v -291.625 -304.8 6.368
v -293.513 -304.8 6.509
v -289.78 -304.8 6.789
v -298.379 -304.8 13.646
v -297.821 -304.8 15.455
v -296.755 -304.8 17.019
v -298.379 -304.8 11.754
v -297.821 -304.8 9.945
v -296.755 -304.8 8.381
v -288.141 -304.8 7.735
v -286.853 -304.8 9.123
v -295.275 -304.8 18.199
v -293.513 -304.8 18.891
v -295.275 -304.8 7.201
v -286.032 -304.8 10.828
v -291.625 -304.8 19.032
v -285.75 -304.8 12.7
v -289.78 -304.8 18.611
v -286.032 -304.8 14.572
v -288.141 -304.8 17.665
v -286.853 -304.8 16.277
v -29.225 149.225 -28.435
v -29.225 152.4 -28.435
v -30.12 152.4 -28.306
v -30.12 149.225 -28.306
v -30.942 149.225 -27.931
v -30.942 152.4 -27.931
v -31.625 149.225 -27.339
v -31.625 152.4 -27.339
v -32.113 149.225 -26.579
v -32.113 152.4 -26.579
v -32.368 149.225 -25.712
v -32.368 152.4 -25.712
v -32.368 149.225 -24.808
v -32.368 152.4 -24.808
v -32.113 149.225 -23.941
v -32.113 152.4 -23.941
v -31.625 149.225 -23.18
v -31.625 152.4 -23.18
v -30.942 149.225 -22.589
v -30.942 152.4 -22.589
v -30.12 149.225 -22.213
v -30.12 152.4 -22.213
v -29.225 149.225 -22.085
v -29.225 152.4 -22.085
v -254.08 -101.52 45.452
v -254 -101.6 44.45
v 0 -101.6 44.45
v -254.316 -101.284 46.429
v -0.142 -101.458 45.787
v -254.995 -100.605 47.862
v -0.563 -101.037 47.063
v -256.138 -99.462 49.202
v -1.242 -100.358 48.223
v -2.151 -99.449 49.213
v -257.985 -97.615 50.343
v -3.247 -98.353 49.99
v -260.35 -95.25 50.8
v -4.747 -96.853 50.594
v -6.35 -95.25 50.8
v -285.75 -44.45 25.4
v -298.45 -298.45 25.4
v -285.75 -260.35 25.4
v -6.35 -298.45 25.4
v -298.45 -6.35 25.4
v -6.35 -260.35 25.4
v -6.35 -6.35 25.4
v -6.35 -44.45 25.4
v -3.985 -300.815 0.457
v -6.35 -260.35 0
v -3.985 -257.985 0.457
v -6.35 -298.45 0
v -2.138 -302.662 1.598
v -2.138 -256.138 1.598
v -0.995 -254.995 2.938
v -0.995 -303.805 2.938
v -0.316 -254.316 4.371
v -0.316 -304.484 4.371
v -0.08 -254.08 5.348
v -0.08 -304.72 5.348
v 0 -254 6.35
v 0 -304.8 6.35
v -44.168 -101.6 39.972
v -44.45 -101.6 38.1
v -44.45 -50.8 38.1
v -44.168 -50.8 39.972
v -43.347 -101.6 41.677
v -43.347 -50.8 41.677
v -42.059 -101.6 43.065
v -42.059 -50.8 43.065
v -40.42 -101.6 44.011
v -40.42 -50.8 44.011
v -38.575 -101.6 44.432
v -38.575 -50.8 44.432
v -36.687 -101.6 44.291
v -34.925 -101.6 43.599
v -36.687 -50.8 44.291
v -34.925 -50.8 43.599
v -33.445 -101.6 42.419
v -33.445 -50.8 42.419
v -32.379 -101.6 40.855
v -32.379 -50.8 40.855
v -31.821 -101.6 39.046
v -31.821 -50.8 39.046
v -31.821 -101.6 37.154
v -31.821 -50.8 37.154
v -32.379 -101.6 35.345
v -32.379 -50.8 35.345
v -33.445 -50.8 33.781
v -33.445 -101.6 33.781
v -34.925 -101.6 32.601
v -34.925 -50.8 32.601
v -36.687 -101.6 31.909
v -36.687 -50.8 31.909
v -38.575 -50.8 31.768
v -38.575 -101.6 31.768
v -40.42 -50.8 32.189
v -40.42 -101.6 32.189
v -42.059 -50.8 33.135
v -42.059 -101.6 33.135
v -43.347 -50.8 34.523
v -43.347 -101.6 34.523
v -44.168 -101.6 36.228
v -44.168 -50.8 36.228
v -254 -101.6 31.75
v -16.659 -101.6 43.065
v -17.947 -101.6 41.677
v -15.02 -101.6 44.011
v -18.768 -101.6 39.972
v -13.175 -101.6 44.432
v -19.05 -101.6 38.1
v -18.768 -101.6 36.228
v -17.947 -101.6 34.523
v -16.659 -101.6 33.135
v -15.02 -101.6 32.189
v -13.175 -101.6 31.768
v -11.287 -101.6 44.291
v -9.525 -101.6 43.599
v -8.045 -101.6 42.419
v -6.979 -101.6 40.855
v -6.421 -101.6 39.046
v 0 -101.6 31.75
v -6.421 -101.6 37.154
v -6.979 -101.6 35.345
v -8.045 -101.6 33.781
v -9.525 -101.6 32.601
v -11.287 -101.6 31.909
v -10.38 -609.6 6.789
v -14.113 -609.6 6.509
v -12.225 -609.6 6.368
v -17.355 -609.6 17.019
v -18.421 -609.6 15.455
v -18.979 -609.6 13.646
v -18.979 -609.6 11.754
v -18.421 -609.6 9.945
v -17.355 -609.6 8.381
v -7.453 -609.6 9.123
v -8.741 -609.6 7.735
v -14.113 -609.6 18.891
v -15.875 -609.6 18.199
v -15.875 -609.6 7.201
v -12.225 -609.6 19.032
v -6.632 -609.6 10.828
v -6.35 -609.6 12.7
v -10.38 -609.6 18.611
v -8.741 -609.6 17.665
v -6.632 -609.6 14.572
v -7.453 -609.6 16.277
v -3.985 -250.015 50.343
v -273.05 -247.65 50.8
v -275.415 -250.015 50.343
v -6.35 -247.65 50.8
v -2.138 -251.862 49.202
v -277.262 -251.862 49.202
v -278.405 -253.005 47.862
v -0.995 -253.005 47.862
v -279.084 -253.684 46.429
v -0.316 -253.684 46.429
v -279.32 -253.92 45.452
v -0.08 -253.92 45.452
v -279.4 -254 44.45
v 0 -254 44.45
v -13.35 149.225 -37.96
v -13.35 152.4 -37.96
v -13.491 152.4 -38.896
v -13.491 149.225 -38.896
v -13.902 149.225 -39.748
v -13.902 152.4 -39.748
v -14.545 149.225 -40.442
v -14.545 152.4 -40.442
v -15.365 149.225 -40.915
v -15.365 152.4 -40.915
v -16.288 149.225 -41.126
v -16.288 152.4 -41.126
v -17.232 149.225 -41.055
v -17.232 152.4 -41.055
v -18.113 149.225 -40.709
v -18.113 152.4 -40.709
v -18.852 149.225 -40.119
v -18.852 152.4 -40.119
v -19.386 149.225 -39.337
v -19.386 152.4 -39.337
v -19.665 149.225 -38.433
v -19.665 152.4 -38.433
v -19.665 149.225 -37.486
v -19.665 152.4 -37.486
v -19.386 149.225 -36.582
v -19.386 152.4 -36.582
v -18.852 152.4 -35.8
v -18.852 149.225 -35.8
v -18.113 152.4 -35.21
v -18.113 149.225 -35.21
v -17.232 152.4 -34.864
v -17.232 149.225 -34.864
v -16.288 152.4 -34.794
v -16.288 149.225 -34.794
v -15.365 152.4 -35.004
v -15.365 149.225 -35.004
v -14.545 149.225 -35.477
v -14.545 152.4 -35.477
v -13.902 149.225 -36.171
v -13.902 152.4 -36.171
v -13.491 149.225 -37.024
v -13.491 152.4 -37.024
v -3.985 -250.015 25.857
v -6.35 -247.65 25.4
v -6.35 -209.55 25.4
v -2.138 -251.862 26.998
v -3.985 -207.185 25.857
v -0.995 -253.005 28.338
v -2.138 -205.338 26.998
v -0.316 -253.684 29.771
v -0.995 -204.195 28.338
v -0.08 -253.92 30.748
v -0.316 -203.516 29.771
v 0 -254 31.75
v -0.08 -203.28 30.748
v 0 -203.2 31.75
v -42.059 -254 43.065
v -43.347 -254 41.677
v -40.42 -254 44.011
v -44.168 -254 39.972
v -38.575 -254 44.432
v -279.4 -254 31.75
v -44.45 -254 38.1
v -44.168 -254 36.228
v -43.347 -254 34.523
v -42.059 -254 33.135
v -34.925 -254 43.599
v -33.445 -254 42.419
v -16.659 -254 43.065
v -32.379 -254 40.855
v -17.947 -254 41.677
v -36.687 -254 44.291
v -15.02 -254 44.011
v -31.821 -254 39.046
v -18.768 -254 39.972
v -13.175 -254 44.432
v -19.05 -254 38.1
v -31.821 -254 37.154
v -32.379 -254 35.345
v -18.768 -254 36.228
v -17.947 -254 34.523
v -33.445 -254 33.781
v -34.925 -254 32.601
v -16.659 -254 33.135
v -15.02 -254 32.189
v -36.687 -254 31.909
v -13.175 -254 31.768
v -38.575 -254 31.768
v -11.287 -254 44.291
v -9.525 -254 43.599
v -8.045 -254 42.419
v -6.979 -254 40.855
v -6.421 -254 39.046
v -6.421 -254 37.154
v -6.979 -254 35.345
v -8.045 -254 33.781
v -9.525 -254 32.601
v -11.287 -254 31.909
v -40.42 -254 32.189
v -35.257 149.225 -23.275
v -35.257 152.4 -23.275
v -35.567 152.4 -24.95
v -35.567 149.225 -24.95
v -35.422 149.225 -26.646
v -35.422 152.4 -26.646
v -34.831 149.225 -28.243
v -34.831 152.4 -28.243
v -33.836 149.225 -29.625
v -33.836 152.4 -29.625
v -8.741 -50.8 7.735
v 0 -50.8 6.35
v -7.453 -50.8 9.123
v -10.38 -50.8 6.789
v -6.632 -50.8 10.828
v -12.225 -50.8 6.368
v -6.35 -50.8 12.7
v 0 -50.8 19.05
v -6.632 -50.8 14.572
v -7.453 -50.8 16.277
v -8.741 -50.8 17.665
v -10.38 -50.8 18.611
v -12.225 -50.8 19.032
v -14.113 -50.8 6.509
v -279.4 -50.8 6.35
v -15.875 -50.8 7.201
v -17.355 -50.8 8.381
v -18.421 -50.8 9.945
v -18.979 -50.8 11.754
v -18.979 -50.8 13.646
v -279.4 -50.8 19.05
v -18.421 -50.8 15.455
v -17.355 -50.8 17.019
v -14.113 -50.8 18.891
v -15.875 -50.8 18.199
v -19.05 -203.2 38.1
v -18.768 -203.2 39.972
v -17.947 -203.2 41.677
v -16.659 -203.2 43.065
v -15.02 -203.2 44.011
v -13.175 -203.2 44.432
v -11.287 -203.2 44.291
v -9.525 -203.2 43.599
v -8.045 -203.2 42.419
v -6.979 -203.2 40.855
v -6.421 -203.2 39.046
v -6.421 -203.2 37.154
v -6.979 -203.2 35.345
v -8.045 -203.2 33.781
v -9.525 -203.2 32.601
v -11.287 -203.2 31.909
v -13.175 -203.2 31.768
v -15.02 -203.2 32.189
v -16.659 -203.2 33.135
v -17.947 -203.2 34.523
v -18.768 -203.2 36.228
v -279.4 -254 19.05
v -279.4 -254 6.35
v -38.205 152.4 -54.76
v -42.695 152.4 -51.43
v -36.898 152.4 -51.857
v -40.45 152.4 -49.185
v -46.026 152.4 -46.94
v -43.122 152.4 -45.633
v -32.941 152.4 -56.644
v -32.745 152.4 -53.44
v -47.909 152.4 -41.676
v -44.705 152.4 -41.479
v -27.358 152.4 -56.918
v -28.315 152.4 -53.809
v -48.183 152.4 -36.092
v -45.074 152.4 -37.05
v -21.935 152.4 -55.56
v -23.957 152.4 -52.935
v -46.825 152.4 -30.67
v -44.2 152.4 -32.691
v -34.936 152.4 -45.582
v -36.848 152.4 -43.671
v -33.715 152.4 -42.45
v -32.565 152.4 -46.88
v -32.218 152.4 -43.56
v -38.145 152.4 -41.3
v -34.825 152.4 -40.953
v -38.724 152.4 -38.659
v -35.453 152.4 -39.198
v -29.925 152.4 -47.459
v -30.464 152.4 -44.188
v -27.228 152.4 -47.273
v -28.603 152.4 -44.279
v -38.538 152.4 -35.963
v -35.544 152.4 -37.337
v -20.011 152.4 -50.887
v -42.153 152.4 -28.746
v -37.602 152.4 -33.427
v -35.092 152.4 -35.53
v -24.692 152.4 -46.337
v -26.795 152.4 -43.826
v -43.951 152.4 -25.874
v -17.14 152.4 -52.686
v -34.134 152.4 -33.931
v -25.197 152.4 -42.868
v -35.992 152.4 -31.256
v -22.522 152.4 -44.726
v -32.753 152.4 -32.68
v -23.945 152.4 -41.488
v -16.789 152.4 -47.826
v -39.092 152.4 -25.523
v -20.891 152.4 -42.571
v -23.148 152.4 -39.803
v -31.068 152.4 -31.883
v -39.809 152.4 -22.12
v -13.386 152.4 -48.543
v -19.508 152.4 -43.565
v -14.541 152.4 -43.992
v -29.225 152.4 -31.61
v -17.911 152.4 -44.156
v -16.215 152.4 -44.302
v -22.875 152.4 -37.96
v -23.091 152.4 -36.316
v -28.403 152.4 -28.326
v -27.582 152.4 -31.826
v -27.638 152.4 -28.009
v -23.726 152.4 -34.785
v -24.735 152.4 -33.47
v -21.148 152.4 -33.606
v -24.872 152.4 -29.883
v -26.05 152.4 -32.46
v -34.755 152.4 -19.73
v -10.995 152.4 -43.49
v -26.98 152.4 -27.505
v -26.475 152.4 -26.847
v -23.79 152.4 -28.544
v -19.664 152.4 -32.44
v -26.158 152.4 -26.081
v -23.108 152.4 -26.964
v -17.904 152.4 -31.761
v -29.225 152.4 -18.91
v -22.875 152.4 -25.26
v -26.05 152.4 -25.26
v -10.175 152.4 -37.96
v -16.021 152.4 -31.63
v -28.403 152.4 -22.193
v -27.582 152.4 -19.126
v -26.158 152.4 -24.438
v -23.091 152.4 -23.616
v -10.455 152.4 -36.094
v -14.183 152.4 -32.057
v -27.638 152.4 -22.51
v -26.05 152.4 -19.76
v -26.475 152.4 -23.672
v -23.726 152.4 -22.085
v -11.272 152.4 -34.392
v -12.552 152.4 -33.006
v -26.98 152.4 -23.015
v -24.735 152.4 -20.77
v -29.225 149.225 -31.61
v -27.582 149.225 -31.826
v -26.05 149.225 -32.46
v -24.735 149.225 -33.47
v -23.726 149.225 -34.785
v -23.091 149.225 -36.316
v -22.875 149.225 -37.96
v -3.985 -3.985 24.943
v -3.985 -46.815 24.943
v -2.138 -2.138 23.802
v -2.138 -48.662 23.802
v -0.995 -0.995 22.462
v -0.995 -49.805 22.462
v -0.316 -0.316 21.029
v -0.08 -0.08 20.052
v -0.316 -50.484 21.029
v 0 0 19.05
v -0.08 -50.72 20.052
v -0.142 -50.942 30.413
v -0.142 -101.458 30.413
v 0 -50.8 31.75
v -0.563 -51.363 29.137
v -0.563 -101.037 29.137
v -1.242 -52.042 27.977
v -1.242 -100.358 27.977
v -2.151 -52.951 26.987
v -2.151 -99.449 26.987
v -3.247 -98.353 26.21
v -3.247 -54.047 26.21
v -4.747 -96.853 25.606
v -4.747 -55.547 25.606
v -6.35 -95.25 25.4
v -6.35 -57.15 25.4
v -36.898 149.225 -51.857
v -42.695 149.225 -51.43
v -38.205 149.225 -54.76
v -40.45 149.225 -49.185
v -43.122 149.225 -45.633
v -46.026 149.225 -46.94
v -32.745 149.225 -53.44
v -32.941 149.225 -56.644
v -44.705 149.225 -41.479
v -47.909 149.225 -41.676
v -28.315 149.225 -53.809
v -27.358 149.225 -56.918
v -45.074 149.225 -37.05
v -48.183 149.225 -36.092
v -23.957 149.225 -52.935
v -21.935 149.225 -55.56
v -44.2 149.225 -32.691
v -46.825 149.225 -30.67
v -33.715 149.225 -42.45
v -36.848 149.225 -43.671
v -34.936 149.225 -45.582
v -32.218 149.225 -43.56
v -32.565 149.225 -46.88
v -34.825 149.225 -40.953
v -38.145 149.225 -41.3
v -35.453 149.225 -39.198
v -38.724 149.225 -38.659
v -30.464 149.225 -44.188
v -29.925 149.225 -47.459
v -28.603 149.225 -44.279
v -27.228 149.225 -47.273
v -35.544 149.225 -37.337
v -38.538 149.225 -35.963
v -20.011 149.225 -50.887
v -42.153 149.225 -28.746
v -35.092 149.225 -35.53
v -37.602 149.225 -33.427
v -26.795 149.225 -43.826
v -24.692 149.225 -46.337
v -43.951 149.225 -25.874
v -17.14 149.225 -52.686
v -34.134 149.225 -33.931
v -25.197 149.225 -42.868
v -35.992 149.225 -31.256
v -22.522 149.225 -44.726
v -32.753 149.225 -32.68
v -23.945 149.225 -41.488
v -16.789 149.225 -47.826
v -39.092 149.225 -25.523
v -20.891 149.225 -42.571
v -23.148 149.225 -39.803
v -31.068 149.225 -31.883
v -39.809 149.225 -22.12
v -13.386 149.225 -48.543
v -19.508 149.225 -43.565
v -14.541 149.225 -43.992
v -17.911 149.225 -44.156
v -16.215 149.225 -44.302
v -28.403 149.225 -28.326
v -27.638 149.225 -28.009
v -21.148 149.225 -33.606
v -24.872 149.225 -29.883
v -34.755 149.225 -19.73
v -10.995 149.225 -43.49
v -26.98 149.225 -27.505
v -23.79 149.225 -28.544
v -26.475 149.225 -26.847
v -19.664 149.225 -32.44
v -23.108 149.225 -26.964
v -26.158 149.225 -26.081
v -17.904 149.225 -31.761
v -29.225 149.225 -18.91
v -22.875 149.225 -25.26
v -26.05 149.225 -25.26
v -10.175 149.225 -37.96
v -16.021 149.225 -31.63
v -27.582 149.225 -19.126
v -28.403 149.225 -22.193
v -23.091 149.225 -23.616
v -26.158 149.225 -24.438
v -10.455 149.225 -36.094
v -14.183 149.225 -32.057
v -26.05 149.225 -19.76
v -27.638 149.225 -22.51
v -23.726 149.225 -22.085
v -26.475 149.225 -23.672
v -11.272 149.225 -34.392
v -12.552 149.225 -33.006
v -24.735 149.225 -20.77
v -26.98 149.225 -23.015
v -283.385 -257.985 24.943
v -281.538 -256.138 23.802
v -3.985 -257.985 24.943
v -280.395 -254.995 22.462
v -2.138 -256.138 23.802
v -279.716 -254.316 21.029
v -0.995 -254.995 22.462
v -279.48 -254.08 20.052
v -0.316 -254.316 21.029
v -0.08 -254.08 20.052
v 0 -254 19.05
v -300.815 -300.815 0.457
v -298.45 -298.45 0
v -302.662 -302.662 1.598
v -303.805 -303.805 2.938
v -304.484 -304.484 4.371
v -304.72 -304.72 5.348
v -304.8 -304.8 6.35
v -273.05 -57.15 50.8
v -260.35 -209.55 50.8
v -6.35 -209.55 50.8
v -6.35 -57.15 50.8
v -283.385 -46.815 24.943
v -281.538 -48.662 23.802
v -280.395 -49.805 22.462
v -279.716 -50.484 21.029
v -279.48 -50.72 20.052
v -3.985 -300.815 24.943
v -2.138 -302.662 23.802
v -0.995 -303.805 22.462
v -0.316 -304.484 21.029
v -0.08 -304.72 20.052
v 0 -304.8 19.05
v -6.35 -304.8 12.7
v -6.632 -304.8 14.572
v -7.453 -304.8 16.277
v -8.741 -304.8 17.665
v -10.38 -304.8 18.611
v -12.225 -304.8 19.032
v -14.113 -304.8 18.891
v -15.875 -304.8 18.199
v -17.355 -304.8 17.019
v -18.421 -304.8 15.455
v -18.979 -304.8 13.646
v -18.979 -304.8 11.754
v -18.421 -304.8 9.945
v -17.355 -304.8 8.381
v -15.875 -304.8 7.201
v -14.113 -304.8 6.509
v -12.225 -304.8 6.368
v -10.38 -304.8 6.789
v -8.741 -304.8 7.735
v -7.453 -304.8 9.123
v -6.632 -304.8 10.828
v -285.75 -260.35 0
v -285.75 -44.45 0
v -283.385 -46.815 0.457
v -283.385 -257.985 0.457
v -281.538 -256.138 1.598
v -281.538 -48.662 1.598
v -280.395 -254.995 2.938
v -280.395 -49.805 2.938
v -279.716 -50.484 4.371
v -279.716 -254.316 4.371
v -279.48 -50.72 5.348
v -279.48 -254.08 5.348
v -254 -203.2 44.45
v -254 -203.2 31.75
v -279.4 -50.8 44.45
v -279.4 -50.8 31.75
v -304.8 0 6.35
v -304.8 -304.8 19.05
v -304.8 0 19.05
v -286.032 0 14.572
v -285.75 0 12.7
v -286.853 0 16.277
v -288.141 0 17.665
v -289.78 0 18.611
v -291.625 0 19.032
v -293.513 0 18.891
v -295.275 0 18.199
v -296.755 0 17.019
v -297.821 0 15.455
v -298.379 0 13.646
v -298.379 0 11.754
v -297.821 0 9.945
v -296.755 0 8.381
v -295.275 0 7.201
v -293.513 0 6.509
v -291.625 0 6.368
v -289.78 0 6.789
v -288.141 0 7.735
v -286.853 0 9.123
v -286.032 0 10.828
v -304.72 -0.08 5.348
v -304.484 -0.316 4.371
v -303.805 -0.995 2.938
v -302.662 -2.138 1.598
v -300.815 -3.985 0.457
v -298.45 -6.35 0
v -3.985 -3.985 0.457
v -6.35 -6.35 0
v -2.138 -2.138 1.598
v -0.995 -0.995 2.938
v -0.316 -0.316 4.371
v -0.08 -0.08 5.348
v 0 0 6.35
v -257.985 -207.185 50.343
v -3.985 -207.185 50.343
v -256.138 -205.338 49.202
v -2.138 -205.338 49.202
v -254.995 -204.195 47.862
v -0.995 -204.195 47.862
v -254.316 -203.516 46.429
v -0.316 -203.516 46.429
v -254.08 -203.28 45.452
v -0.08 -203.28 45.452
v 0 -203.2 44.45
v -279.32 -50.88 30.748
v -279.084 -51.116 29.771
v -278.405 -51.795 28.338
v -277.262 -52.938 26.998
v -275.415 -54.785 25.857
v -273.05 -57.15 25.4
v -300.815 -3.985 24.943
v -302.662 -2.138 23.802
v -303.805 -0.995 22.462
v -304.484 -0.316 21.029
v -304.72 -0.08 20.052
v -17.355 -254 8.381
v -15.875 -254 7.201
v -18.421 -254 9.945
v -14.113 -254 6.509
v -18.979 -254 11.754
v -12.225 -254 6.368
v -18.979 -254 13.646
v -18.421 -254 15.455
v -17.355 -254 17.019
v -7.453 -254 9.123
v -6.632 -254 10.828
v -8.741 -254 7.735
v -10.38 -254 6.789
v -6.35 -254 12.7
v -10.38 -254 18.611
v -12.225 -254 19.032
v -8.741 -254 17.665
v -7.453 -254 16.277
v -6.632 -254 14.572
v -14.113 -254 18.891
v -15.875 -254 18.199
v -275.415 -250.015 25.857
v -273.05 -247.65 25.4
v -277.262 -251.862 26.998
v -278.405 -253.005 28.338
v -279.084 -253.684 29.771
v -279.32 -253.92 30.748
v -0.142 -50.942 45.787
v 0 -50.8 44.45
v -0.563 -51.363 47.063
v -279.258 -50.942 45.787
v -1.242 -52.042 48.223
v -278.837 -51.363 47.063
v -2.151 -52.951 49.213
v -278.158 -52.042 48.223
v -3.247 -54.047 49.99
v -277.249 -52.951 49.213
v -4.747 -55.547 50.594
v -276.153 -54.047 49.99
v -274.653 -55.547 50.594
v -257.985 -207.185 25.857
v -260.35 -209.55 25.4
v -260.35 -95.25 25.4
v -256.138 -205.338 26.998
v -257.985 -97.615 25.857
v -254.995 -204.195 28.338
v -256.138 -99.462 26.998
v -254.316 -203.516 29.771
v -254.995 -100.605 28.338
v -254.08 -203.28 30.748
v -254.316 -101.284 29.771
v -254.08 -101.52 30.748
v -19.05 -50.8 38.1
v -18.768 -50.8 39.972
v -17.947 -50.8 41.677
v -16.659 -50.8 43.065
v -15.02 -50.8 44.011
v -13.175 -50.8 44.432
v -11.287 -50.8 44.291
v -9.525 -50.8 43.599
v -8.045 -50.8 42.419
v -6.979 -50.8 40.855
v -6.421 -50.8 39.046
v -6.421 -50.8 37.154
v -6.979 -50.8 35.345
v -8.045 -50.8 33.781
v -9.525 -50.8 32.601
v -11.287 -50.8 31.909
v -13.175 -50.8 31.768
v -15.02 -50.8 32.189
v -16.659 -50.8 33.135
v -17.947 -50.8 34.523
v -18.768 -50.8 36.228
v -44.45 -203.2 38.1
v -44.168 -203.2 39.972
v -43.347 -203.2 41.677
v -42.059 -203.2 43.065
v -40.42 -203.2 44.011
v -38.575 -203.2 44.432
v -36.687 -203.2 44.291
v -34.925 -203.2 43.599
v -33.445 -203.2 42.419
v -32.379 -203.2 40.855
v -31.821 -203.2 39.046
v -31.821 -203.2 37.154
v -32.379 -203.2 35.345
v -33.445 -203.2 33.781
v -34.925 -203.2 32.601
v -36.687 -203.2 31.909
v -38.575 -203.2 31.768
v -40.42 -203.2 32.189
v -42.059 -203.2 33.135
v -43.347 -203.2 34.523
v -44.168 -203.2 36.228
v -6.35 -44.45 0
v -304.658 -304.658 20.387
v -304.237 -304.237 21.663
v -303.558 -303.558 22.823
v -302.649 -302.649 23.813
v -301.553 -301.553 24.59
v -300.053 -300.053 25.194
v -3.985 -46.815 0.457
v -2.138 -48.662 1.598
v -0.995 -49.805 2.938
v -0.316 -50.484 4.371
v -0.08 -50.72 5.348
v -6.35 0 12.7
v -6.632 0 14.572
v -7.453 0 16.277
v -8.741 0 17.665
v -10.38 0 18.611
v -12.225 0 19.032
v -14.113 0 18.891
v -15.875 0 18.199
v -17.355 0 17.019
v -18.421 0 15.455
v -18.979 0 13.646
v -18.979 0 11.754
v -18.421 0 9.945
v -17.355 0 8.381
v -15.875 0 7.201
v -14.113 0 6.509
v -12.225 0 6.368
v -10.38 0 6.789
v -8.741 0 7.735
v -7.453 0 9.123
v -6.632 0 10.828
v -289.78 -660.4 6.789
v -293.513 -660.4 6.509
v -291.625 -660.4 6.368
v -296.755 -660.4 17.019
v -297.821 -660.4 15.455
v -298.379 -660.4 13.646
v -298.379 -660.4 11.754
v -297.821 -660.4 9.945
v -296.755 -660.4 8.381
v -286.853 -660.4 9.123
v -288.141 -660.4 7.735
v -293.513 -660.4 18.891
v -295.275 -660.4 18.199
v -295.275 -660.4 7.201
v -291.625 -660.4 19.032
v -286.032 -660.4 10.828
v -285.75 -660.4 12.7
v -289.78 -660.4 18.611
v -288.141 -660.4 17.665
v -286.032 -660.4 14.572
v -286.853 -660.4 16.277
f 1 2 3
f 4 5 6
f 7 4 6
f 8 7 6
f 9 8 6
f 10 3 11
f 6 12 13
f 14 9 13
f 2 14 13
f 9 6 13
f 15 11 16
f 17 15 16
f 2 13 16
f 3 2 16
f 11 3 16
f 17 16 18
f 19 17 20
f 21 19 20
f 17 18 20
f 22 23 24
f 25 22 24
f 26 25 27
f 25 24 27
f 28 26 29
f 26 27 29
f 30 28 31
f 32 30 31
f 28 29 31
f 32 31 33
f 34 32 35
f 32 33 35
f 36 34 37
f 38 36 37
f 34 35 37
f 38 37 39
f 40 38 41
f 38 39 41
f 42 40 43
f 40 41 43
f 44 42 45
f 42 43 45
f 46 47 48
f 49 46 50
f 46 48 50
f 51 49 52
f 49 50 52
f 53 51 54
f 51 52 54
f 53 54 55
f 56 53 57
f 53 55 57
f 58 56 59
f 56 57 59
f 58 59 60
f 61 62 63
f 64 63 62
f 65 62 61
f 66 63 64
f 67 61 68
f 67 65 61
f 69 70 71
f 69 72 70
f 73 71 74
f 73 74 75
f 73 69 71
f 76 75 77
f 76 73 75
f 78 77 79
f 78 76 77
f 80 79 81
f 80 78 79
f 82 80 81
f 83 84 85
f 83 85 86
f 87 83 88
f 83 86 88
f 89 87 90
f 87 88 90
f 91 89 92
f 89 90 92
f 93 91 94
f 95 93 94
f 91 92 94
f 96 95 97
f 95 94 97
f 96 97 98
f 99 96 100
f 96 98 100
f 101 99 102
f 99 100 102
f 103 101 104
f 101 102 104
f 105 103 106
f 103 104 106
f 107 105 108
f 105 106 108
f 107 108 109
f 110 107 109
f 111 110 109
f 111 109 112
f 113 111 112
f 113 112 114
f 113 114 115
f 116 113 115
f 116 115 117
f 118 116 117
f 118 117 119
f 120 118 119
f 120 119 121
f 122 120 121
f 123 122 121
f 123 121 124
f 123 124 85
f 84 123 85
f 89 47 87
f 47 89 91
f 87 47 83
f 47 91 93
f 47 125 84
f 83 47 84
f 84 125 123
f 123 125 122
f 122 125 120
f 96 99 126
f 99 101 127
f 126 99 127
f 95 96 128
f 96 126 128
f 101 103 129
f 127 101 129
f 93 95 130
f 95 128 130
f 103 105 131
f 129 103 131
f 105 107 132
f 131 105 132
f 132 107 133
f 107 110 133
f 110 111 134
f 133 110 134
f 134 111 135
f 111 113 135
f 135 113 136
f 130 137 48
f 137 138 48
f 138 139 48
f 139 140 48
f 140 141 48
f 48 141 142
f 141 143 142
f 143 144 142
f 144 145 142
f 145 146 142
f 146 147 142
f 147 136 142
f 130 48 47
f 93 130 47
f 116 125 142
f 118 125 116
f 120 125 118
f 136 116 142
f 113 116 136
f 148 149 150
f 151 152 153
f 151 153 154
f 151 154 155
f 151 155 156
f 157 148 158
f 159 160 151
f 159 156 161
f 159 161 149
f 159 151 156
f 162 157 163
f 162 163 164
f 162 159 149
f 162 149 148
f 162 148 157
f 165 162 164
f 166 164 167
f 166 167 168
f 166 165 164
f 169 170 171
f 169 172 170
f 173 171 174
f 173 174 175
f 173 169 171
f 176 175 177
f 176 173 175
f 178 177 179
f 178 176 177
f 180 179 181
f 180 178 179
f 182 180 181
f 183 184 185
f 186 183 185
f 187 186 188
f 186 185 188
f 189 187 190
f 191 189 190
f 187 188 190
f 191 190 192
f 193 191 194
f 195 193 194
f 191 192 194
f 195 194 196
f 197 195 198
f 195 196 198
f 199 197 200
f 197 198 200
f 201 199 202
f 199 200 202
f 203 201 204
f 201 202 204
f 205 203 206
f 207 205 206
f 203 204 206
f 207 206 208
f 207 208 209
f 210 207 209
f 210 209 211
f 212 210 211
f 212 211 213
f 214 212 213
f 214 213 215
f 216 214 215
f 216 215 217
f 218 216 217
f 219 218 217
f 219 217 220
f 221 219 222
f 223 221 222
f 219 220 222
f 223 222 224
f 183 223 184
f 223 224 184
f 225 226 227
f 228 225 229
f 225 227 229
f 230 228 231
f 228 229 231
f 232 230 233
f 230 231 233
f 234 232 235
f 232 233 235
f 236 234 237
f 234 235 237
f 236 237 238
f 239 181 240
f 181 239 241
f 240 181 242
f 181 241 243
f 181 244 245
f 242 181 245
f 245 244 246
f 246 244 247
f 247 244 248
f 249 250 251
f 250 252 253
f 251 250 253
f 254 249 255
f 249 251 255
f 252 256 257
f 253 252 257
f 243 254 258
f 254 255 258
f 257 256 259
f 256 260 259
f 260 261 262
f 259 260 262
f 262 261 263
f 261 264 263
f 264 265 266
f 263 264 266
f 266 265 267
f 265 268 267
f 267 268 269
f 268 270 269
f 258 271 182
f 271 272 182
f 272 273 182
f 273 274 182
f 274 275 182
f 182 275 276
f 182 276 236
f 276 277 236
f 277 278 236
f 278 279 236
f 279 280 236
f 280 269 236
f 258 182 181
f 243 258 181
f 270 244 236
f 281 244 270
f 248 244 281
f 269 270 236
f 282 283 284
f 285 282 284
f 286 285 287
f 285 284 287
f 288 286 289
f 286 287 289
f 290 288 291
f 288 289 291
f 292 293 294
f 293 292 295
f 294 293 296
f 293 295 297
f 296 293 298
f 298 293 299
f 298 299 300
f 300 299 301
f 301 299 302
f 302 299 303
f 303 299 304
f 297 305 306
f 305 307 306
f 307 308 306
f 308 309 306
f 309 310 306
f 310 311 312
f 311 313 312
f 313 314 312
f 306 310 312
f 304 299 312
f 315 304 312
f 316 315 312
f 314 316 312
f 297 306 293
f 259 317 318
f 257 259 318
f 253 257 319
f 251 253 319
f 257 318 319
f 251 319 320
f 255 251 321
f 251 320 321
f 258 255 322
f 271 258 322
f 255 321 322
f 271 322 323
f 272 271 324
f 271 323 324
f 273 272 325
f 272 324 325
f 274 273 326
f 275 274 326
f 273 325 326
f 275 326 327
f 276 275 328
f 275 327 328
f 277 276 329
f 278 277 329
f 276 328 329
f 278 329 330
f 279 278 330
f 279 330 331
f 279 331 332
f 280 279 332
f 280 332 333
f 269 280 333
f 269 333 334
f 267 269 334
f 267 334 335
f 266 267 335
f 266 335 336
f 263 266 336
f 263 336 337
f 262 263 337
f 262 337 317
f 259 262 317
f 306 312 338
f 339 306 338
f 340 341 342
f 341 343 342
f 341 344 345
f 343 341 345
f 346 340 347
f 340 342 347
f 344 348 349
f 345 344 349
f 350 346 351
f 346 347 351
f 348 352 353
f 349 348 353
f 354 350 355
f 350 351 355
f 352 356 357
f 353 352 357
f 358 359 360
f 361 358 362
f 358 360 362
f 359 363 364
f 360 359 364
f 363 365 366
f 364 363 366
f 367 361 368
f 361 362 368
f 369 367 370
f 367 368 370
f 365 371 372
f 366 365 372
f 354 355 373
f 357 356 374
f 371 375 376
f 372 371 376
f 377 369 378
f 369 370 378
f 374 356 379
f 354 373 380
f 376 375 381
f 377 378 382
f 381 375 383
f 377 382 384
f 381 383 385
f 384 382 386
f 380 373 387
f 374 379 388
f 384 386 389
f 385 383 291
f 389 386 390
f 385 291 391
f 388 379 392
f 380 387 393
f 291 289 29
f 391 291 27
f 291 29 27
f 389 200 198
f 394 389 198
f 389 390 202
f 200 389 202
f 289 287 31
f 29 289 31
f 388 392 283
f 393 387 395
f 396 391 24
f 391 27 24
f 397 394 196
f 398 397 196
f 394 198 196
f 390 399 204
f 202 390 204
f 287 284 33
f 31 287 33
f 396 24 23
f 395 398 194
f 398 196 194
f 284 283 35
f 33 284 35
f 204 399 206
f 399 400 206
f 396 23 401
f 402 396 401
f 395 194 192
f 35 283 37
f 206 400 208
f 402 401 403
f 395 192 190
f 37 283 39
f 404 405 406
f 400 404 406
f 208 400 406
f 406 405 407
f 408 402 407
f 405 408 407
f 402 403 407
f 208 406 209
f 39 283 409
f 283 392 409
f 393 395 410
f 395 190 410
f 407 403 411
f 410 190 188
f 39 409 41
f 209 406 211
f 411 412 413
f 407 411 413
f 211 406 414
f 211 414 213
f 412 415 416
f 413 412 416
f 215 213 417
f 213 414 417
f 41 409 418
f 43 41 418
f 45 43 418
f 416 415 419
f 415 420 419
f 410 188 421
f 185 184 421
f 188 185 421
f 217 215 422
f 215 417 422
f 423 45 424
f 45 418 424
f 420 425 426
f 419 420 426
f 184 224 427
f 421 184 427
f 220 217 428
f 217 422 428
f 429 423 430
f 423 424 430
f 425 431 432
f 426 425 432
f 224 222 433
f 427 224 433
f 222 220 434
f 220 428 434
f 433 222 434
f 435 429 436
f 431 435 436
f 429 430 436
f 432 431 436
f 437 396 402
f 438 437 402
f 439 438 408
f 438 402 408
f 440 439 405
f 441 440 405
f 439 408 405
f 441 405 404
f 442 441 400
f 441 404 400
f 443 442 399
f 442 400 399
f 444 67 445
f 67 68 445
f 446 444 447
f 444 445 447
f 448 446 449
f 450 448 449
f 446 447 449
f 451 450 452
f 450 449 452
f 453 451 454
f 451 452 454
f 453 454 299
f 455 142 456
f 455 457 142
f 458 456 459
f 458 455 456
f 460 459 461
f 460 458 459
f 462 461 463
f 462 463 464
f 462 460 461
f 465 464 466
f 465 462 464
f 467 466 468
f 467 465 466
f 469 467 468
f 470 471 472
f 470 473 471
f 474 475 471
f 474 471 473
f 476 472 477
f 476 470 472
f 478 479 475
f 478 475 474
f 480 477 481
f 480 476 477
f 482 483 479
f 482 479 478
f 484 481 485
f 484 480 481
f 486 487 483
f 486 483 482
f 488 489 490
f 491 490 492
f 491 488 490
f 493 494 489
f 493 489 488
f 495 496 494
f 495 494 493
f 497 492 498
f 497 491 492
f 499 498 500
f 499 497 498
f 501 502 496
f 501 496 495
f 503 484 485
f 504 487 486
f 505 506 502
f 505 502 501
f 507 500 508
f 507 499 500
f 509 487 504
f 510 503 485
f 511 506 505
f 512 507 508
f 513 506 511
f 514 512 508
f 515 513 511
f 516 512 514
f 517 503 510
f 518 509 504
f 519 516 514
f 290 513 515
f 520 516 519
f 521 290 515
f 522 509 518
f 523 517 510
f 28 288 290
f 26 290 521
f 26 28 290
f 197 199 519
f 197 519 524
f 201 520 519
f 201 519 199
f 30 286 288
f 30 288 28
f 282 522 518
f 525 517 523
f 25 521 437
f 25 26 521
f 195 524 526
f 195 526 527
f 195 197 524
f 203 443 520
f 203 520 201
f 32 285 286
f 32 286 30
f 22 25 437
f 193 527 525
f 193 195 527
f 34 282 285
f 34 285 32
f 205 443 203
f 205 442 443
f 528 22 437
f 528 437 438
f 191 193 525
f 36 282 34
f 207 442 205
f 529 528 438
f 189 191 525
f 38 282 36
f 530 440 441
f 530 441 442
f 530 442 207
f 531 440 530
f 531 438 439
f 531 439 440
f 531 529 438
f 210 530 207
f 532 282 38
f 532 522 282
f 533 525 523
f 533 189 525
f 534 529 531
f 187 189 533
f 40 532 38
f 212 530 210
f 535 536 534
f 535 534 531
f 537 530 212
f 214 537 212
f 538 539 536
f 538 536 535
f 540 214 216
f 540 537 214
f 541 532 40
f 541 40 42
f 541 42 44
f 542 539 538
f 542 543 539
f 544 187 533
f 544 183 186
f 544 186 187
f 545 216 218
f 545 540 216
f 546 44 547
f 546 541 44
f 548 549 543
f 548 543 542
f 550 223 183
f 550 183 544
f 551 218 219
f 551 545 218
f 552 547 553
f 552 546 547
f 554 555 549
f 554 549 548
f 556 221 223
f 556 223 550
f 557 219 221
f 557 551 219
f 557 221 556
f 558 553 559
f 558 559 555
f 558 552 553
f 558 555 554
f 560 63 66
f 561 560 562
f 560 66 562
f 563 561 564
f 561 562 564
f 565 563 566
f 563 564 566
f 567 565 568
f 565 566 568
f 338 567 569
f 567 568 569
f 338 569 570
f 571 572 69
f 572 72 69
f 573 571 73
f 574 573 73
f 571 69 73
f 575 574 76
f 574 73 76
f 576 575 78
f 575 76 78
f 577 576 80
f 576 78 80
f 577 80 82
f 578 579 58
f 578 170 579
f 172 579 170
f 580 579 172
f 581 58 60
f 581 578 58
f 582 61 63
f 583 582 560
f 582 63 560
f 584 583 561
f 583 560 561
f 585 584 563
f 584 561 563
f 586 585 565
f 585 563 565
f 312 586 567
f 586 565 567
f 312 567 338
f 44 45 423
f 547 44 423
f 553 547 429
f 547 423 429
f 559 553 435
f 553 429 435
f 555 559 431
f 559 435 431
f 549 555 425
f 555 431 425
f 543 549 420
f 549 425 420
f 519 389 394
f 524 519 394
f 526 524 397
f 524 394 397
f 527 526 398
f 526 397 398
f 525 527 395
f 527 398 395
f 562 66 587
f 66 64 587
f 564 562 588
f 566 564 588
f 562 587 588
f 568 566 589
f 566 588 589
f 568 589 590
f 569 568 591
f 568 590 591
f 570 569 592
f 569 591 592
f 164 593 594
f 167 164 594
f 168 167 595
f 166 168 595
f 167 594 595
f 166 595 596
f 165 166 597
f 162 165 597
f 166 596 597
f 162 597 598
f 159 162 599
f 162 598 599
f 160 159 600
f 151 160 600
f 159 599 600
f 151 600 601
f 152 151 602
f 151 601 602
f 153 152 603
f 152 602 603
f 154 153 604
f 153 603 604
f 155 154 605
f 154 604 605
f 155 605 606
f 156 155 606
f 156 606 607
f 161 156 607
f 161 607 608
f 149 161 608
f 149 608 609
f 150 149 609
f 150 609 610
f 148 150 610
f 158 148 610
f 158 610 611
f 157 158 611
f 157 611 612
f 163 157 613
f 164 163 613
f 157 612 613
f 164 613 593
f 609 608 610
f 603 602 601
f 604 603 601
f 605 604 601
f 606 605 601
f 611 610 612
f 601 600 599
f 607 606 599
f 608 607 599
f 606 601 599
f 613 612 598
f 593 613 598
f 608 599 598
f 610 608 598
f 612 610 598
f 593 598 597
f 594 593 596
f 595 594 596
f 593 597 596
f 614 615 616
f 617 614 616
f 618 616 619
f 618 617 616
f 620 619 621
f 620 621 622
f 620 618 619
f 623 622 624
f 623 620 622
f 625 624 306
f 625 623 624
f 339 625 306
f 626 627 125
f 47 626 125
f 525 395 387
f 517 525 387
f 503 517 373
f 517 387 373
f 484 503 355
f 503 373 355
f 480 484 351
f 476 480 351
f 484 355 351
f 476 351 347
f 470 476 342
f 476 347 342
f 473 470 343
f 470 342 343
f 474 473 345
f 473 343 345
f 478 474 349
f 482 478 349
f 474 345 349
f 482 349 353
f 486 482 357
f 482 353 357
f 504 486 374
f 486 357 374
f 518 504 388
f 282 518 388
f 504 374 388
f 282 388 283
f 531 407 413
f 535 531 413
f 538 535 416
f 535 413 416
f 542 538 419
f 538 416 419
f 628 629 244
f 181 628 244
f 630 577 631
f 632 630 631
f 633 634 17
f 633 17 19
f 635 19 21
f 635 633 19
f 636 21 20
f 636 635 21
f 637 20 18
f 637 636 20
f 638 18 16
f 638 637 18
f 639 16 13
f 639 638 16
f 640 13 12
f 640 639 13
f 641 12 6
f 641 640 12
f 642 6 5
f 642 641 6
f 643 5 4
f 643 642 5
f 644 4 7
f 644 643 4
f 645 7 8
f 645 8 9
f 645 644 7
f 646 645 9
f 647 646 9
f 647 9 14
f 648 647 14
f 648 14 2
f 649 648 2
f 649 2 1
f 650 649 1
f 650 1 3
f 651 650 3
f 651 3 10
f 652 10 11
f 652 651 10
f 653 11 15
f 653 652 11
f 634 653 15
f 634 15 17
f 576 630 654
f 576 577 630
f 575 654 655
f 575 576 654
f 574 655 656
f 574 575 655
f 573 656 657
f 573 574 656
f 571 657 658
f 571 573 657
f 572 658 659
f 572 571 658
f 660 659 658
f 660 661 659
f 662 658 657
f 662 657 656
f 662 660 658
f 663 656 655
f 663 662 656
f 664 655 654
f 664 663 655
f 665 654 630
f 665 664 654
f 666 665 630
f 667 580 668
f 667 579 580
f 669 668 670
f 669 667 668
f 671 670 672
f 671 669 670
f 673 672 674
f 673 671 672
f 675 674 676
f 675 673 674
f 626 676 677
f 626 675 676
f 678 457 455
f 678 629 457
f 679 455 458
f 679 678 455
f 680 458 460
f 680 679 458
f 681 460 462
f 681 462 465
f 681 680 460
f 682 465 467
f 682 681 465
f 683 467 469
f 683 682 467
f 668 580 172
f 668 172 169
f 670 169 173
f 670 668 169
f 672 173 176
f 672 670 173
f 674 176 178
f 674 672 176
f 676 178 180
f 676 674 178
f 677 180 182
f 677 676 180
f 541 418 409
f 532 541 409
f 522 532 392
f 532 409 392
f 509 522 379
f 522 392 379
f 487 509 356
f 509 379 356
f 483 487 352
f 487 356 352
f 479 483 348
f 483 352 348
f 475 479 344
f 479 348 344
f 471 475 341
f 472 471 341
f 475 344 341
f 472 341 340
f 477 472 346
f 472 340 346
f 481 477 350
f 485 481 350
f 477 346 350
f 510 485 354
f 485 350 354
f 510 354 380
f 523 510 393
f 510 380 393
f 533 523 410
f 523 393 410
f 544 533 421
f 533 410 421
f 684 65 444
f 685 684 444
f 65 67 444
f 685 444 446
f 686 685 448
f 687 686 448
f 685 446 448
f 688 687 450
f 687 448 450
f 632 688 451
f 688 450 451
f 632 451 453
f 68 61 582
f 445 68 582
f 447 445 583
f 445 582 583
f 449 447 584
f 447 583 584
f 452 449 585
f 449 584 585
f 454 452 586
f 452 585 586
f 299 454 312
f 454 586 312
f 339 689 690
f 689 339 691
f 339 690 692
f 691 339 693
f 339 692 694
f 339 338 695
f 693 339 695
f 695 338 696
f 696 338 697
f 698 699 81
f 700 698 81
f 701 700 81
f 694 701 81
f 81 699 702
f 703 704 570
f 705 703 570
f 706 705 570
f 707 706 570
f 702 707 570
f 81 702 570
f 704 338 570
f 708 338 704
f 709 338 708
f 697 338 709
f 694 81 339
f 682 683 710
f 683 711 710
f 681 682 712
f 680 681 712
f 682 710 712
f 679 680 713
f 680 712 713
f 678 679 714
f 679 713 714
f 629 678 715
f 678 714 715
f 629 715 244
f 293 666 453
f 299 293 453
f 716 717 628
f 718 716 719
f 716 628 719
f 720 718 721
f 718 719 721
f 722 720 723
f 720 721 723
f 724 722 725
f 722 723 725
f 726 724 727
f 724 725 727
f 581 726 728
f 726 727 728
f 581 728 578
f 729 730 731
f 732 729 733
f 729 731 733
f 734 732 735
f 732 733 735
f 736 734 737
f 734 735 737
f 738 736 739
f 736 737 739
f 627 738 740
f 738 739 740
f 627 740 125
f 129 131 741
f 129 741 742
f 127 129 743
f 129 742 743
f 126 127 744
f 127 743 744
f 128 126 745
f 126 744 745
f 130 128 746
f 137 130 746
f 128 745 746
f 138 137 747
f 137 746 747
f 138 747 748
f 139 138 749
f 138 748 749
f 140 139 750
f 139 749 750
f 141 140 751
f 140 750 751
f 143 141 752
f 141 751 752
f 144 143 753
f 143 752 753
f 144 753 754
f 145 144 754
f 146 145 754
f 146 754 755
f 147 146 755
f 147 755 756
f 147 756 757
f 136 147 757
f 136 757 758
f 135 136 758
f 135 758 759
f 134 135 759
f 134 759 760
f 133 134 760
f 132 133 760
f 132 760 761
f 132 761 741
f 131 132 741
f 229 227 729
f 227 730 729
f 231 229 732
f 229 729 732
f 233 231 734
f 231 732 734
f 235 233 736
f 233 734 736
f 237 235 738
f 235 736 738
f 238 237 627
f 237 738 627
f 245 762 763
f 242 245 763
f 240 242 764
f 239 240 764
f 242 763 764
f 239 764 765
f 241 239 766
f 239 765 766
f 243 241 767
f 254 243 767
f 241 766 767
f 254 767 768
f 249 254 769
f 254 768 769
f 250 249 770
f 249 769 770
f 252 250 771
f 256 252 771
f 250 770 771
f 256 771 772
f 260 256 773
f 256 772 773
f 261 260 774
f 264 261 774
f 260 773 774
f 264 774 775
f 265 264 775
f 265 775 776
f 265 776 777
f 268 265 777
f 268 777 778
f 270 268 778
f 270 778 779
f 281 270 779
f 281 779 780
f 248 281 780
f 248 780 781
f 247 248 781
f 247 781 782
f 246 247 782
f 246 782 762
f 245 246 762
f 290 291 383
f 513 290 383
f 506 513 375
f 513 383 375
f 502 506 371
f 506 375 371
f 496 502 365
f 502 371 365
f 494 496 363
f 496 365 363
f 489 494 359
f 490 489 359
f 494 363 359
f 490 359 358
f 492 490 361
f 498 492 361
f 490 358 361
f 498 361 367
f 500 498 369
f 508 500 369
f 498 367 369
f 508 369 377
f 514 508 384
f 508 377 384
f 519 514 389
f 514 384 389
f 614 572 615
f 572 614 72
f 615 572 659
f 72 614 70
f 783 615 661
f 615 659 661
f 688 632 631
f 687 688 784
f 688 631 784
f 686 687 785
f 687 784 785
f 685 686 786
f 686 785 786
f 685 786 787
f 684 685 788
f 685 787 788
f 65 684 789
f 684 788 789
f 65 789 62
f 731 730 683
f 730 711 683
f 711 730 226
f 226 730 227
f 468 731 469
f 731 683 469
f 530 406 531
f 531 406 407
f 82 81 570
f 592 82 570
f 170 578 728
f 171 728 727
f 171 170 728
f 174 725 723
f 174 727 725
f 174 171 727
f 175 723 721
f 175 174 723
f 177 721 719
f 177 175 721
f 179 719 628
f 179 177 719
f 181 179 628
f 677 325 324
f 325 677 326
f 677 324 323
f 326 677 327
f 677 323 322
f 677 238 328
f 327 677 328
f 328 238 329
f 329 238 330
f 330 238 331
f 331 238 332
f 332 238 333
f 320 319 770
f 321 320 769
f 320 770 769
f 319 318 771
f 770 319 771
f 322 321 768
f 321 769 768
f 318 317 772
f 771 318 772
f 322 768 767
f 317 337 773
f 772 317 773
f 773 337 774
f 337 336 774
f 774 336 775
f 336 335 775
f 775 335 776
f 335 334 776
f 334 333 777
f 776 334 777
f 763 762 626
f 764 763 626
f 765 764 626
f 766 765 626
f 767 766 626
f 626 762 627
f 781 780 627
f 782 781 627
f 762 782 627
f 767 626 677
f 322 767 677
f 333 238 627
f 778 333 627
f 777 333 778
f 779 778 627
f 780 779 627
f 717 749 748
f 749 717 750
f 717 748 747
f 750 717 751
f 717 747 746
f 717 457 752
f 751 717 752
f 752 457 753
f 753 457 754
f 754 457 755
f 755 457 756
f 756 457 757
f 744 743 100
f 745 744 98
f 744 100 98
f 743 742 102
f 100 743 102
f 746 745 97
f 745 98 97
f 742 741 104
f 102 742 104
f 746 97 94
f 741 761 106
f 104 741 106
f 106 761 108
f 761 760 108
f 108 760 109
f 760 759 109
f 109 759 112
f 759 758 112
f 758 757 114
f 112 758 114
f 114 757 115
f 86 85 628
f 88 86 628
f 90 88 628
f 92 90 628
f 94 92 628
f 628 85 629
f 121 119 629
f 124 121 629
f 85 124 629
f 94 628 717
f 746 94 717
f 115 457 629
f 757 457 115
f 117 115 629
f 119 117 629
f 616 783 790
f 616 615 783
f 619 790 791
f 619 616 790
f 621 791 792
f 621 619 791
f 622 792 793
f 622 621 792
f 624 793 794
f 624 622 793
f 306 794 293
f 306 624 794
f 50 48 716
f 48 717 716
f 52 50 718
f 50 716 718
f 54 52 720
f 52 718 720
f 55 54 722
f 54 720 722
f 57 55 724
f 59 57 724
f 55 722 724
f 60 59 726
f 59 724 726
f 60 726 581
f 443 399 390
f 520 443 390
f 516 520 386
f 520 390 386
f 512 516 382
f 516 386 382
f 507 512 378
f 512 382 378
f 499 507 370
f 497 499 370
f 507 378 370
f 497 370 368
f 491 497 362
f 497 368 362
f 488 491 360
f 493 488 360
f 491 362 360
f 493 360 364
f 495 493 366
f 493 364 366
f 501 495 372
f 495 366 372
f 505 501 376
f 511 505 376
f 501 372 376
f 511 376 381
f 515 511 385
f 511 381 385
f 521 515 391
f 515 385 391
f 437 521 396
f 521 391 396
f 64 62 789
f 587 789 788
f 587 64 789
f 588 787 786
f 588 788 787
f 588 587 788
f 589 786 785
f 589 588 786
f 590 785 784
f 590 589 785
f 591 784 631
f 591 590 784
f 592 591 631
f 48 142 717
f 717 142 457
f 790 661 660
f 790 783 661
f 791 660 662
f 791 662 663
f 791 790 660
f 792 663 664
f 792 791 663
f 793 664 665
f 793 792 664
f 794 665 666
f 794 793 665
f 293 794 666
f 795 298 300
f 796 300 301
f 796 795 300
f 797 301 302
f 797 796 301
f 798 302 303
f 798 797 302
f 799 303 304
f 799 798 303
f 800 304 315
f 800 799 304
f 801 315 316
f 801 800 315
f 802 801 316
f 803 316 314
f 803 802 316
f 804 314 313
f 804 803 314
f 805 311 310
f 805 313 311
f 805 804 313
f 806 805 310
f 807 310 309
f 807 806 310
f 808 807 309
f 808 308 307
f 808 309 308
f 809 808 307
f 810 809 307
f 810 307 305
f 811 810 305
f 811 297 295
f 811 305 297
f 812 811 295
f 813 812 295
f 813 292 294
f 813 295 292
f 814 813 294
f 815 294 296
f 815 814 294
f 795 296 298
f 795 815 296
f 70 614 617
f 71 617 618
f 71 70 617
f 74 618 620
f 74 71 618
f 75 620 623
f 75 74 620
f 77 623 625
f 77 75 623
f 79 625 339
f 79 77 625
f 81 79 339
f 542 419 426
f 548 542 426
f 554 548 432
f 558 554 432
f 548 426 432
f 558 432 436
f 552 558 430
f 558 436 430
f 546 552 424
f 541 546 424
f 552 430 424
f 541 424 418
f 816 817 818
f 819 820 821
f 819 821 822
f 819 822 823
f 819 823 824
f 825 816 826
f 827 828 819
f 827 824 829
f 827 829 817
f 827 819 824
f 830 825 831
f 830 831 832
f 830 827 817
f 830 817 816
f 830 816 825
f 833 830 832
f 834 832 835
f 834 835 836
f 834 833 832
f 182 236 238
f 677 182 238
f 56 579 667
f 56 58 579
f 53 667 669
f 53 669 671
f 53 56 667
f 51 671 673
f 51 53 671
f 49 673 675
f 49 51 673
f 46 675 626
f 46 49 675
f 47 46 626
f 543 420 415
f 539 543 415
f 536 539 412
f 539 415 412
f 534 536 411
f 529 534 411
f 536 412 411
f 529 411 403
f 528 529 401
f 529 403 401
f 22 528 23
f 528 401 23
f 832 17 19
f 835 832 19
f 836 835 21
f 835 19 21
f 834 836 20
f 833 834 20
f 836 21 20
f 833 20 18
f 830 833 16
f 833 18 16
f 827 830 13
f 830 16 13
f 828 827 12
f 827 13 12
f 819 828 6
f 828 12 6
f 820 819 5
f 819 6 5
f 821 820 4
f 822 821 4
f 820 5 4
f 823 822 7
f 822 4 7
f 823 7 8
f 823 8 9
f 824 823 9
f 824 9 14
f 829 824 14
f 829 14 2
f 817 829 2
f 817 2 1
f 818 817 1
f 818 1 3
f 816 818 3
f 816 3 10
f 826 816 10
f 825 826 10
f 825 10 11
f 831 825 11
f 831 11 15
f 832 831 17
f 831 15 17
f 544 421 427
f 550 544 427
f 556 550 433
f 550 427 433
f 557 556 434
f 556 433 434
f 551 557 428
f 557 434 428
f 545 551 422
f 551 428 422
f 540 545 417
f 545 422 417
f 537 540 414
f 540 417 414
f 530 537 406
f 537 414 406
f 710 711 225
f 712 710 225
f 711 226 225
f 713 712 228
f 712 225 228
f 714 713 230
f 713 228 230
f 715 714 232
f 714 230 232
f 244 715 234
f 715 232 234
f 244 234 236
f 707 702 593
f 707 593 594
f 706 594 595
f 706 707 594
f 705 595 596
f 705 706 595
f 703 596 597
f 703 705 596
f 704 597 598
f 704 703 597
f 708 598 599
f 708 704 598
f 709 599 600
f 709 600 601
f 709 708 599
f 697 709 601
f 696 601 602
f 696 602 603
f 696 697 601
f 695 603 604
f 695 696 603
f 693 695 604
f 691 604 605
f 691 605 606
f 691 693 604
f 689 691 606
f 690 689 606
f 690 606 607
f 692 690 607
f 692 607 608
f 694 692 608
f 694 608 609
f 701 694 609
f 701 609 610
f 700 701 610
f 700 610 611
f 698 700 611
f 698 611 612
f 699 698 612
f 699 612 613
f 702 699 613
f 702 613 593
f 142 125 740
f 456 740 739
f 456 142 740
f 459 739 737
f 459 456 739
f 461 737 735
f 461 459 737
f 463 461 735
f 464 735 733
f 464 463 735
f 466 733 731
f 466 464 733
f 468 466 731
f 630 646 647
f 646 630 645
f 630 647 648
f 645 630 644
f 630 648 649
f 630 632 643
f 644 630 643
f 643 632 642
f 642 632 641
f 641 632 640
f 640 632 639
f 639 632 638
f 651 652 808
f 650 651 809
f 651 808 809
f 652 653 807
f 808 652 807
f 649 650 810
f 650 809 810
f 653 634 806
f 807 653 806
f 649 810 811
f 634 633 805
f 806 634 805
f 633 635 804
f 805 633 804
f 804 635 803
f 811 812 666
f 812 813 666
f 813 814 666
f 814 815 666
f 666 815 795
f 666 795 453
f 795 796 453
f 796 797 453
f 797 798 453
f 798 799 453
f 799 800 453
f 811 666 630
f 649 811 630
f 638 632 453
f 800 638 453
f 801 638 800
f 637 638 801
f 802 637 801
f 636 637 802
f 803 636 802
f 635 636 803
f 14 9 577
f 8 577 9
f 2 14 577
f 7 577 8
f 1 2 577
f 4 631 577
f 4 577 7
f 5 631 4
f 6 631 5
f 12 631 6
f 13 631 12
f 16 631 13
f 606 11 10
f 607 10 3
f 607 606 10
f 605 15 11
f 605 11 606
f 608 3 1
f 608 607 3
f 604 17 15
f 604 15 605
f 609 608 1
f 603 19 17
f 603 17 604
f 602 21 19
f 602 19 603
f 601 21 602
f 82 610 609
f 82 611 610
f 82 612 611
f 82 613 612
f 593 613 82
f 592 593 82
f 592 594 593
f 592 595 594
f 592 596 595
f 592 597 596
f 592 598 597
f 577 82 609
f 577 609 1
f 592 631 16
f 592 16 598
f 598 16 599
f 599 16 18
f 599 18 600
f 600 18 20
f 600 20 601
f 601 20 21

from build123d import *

# Parameters (mm, degrees)
F0_W      = 304.8
F0_H      = 25.4
F0_R      = 6.35
F1_DEPTH  = 304.8
F3_DEPTH  = 25.4
F4_R      = 6.35
F5_DEPTH  = 254.001
F2_W      = 254
F2_H      = 101.6
F6_DEPTH  = 25.401
F7_R      = 6.35
F8_DEPTH  = 304.8
F9_R      = 6.35
F10_DEPTH = 355.6
F11_R     = 6.34999
F11_2_R   = 6.34999
F14_DEPTH = 3.175


# Not quite as in the source:
# - a fillet or chamfer is up to 0.001 mm smaller than in the source, because OpenCascade refuses the exact size
# - a feature names something its author has since deleted; it is built from what else it names


with BuildPart() as f1:
    # F0 (on Front) → F1 (new body)
    with BuildSketch(Plane.XZ):
        with Locations((-152.4, 12.7)):
            Rectangle(F0_W, F0_H)
        with Locations((-292.1, 12.7)):
            Circle(F0_R, mode=Mode.SUBTRACT)
        with Locations((-12.7, 12.7)):
            Circle(F0_R, mode=Mode.SUBTRACT)
    extrude(amount=F1_DEPTH)

    # F2 (on face) → F6 (cut, through all)
    with BuildSketch(Plane.XY.offset(25.4)):
        Polygon((0, -101.6), (0, -50.8), (-279.4, -50.8), (-279.4, -254), (0, -254), (0, -203.2), (-254, -203.2), (-254, -101.6), align=None)
        with Locations((-127, -152.4)):
            Rectangle(F2_W, F2_H)
    extrude(amount=-F6_DEPTH, mode=Mode.SUBTRACT)

    # F11 (radius 6.35 in the source; OpenCascade refuses exactly that, so slightly less here)
    f11_edges = [f1.edges().sort_by_distance(p)[0] for p in [
        (-152.4, 0, 25.4),
        (-304.8, -152.4, 25.4),
        (-152.4, -304.8, 25.4),
        (0, -279.4, 25.4),
        (-139.7, -254, 25.4),
        (-279.4, -152.4, 25.4),
        (-139.7, -50.8, 25.4),
        (0, -25.4, 25.4),
        (-152.4, 0, 0),
        (0, -25.4, 0),
        (-139.7, -50.8, 0),
        (-279.4, -152.4, 0),
        (-139.7, -254, 0),
        (0, -279.4, 0),
        (-152.4, -304.8, 0),
        (-304.8, -152.4, 0),
    ]]
    fillet(f11_edges, radius=F11_R)


with BuildPart() as f3:
    # F2 (on face) → F3 (new body)
    with BuildSketch(Plane.XY.offset(25.4)):
        Polygon((0, -101.6), (0, -50.8), (-279.4, -50.8), (-279.4, -254), (0, -254), (0, -203.2), (-254, -203.2), (-254, -101.6), align=None)
    extrude(amount=F3_DEPTH)

    # F4 (on face) → F5 (cut, through all)
    with BuildSketch(Plane(origin=(0, -50.8, 0), x_dir=(-1, 0, 0), z_dir=(0, 1, 0))):
        with Locations((12.7, 38.1)):
            Circle(F4_R)
        with Locations((38.1, 38.1)):
            Circle(F4_R)
    extrude(amount=-F5_DEPTH, mode=Mode.SUBTRACT)

    # F11#2 (radius 6.35 in the source; OpenCascade refuses exactly that, so slightly less here)
    f11_2_edges = [f3.edges().sort_by_distance(p)[0] for p in [
        (-139.7, -254, 25.4),
        (-279.4, -152.4, 25.4),
        (-139.7, -50.8, 25.4),
        (0, -76.2, 50.8),
        (-139.7, -50.8, 50.8),
        (-279.4, -152.4, 50.8),
        (-139.7, -254, 50.8),
        (0, -228.6, 50.8),
        (-127, -203.2, 50.8),
        (-254, -152.4, 50.8),
        (-127, -101.6, 50.8),
        (0, -76.2, 25.4),
        (0, -228.6, 25.4),
        (-127, -203.2, 25.4),
        (-254, -152.4, 25.4),
        (-127, -101.6, 25.4),
    ]]
    fillet(f11_2_edges, radius=F11_2_R)


with BuildPart() as f8:
    # F7 (on face) → F8 (new body)
    with BuildSketch(Plane.XZ.offset(304.8)):
        with Locations((-12.7, 12.7)):
            Circle(F7_R)
    extrude(amount=F8_DEPTH)


with BuildPart() as f10:
    # F9 (on face) → F10 (new body)
    with BuildSketch(Plane.XZ.offset(304.8)):
        with Locations((-292.1, 12.7)):
            Circle(F9_R)
    extrude(amount=F10_DEPTH)


with BuildPart() as f14:
    # F13 (on offset) → F14 (new body)
    with BuildSketch(Plane.XZ.offset(-152.4)):
        with BuildLine():
            ThreePointArc((-29.2250082641, -18.9096650779), (-42.6953924457, -51.4300492595), (-10.1750082641, -37.9596650779))
            ThreePointArc((-10.1750082641, -37.9596650779), (-11.3809203347, -41.6826825873), (-14.5406332641, -43.9916428514))
            ThreePointArc((-14.5406332641, -43.9916428514), (-40.4503284154, -49.1849852293), (-35.2569860376, -23.2752900779))
            ThreePointArc((-35.2569860376, -23.2752900779), (-32.9480257735, -20.1155771486), (-29.2250082641, -18.9096650779))
        make_face()
        with BuildLine():
            ThreePointArc((-20.8906332641, -42.5709358745), (-22.3578557141, -40.4697229707), (-22.8750082641, -37.9596650779))
            ThreePointArc((-22.8750082641, -37.9596650779), (-33.7151363246, -42.4497931385), (-29.2250082641, -31.6096650779))
            ThreePointArc((-29.2250082641, -31.6096650779), (-31.7350661569, -31.0925125279), (-33.8362790607, -29.6252900779))
            ThreePointArc((-33.8362790607, -29.6252900779), (-35.9602003549, -44.6948571687), (-20.8906332641, -42.5709358745))
        make_face()
        with BuildLine():
            ThreePointArc((-35.2569860376, -23.2752900779), (-35.4218066335, -26.6460957358), (-33.8362790607, -29.6252900779))
            ThreePointArc((-33.8362790607, -29.6252900779), (-31.6062582641, -28.7371234848), (-29.2250082641, -28.4346650779))
            ThreePointArc((-29.2250082641, -28.4346650779), (-32.4000082641, -25.2596650779), (-29.2250082641, -22.0846650779))
            ThreePointArc((-29.2250082641, -22.0846650779), (-32.2991887952, -22.3851654371), (-35.2569860376, -23.2752900779))
        make_face()
        with BuildLine():
            ThreePointArc((-33.8362790607, -29.6252900779), (-31.7350661569, -31.0925125279), (-29.2250082641, -31.6096650779))
            ThreePointArc((-29.2250082641, -31.6096650779), (-26.8833074573, -31.1621168847), (-24.8716929388, -29.8825587257))
            ThreePointArc((-24.8716929388, -29.8825587257), (-23.3955120459, -27.7774962562), (-22.8750082641, -25.2596650779))
            ThreePointArc((-22.8750082641, -25.2596650779), (-24.7348802036, -20.7695370174), (-29.2250082641, -18.9096650779))
            ThreePointArc((-29.2250082641, -18.9096650779), (-32.9480257735, -20.1155771486), (-35.2569860376, -23.2752900779))
            ThreePointArc((-35.2569860376, -23.2752900779), (-32.2991887952, -22.3851654371), (-29.2250082641, -22.0846650779))
            ThreePointArc((-29.2250082641, -22.0846650779), (-26.9799442338, -23.0146010477), (-26.0500082641, -25.2596650779))
            ThreePointArc((-26.0500082641, -25.2596650779), (-26.9799442338, -27.5047291082), (-29.2250082641, -28.4346650779))
            ThreePointArc((-29.2250082641, -28.4346650779), (-31.6062582641, -28.7371234848), (-33.8362790607, -29.6252900779))
        make_face()
        with BuildLine():
            ThreePointArc((-21.1479019119, -33.6063497526), (-22.4274600709, -35.6179642712), (-22.8750082641, -37.9596650779))
            ThreePointArc((-22.8750082641, -37.9596650779), (-22.3578557141, -40.4697229707), (-20.8906332641, -42.5709358745))
            ThreePointArc((-20.8906332641, -42.5709358745), (-20.0024666709, -40.3409150779), (-19.7000082641, -37.9596650779))
            ThreePointArc((-19.7000082641, -37.9596650779), (-16.5250082641, -34.7846650779), (-13.3500082641, -37.9596650779))
            ThreePointArc((-13.3500082641, -37.9596650779), (-13.6505086233, -41.033845609), (-14.5406332641, -43.9916428514))
            ThreePointArc((-14.5406332641, -43.9916428514), (-11.3809203347, -41.6826825873), (-10.1750082641, -37.9596650779))
            ThreePointArc((-10.1750082641, -37.9596650779), (-14.1833074573, -32.0572132711), (-21.1479019119, -33.6063497526))
        make_face()
        with BuildLine():
            ThreePointArc((-19.7000082641, -37.9596650779), (-20.0024666709, -40.3409150779), (-20.8906332641, -42.5709358745))
            ThreePointArc((-20.8906332641, -42.5709358745), (-17.911438922, -44.1564634473), (-14.5406332641, -43.9916428514))
            ThreePointArc((-14.5406332641, -43.9916428514), (-13.6505086233, -41.033845609), (-13.3500082641, -37.9596650779))
            ThreePointArc((-13.3500082641, -37.9596650779), (-16.5250082641, -41.1346650779), (-19.7000082641, -37.9596650779))
        make_face()
        with BuildLine():
            ThreePointArc((-29.2250082641, -31.6096650779), (-24.7348802036, -33.4695370174), (-22.8750082641, -37.9596650779))
            ThreePointArc((-22.8750082641, -37.9596650779), (-22.4274600709, -35.6179642712), (-21.1479019119, -33.6063497526))
            Line((-21.1479019119, -33.6063497526), (-24.8716929388, -29.8825587257))
            ThreePointArc((-24.8716929388, -29.8825587257), (-26.8833074573, -31.1621168847), (-29.2250082641, -31.6096650779))
        make_face()
    extrude(amount=F14_DEPTH)


solid = Compound([f1.part, f3.part, f8.part, f10.part, f14.part])
